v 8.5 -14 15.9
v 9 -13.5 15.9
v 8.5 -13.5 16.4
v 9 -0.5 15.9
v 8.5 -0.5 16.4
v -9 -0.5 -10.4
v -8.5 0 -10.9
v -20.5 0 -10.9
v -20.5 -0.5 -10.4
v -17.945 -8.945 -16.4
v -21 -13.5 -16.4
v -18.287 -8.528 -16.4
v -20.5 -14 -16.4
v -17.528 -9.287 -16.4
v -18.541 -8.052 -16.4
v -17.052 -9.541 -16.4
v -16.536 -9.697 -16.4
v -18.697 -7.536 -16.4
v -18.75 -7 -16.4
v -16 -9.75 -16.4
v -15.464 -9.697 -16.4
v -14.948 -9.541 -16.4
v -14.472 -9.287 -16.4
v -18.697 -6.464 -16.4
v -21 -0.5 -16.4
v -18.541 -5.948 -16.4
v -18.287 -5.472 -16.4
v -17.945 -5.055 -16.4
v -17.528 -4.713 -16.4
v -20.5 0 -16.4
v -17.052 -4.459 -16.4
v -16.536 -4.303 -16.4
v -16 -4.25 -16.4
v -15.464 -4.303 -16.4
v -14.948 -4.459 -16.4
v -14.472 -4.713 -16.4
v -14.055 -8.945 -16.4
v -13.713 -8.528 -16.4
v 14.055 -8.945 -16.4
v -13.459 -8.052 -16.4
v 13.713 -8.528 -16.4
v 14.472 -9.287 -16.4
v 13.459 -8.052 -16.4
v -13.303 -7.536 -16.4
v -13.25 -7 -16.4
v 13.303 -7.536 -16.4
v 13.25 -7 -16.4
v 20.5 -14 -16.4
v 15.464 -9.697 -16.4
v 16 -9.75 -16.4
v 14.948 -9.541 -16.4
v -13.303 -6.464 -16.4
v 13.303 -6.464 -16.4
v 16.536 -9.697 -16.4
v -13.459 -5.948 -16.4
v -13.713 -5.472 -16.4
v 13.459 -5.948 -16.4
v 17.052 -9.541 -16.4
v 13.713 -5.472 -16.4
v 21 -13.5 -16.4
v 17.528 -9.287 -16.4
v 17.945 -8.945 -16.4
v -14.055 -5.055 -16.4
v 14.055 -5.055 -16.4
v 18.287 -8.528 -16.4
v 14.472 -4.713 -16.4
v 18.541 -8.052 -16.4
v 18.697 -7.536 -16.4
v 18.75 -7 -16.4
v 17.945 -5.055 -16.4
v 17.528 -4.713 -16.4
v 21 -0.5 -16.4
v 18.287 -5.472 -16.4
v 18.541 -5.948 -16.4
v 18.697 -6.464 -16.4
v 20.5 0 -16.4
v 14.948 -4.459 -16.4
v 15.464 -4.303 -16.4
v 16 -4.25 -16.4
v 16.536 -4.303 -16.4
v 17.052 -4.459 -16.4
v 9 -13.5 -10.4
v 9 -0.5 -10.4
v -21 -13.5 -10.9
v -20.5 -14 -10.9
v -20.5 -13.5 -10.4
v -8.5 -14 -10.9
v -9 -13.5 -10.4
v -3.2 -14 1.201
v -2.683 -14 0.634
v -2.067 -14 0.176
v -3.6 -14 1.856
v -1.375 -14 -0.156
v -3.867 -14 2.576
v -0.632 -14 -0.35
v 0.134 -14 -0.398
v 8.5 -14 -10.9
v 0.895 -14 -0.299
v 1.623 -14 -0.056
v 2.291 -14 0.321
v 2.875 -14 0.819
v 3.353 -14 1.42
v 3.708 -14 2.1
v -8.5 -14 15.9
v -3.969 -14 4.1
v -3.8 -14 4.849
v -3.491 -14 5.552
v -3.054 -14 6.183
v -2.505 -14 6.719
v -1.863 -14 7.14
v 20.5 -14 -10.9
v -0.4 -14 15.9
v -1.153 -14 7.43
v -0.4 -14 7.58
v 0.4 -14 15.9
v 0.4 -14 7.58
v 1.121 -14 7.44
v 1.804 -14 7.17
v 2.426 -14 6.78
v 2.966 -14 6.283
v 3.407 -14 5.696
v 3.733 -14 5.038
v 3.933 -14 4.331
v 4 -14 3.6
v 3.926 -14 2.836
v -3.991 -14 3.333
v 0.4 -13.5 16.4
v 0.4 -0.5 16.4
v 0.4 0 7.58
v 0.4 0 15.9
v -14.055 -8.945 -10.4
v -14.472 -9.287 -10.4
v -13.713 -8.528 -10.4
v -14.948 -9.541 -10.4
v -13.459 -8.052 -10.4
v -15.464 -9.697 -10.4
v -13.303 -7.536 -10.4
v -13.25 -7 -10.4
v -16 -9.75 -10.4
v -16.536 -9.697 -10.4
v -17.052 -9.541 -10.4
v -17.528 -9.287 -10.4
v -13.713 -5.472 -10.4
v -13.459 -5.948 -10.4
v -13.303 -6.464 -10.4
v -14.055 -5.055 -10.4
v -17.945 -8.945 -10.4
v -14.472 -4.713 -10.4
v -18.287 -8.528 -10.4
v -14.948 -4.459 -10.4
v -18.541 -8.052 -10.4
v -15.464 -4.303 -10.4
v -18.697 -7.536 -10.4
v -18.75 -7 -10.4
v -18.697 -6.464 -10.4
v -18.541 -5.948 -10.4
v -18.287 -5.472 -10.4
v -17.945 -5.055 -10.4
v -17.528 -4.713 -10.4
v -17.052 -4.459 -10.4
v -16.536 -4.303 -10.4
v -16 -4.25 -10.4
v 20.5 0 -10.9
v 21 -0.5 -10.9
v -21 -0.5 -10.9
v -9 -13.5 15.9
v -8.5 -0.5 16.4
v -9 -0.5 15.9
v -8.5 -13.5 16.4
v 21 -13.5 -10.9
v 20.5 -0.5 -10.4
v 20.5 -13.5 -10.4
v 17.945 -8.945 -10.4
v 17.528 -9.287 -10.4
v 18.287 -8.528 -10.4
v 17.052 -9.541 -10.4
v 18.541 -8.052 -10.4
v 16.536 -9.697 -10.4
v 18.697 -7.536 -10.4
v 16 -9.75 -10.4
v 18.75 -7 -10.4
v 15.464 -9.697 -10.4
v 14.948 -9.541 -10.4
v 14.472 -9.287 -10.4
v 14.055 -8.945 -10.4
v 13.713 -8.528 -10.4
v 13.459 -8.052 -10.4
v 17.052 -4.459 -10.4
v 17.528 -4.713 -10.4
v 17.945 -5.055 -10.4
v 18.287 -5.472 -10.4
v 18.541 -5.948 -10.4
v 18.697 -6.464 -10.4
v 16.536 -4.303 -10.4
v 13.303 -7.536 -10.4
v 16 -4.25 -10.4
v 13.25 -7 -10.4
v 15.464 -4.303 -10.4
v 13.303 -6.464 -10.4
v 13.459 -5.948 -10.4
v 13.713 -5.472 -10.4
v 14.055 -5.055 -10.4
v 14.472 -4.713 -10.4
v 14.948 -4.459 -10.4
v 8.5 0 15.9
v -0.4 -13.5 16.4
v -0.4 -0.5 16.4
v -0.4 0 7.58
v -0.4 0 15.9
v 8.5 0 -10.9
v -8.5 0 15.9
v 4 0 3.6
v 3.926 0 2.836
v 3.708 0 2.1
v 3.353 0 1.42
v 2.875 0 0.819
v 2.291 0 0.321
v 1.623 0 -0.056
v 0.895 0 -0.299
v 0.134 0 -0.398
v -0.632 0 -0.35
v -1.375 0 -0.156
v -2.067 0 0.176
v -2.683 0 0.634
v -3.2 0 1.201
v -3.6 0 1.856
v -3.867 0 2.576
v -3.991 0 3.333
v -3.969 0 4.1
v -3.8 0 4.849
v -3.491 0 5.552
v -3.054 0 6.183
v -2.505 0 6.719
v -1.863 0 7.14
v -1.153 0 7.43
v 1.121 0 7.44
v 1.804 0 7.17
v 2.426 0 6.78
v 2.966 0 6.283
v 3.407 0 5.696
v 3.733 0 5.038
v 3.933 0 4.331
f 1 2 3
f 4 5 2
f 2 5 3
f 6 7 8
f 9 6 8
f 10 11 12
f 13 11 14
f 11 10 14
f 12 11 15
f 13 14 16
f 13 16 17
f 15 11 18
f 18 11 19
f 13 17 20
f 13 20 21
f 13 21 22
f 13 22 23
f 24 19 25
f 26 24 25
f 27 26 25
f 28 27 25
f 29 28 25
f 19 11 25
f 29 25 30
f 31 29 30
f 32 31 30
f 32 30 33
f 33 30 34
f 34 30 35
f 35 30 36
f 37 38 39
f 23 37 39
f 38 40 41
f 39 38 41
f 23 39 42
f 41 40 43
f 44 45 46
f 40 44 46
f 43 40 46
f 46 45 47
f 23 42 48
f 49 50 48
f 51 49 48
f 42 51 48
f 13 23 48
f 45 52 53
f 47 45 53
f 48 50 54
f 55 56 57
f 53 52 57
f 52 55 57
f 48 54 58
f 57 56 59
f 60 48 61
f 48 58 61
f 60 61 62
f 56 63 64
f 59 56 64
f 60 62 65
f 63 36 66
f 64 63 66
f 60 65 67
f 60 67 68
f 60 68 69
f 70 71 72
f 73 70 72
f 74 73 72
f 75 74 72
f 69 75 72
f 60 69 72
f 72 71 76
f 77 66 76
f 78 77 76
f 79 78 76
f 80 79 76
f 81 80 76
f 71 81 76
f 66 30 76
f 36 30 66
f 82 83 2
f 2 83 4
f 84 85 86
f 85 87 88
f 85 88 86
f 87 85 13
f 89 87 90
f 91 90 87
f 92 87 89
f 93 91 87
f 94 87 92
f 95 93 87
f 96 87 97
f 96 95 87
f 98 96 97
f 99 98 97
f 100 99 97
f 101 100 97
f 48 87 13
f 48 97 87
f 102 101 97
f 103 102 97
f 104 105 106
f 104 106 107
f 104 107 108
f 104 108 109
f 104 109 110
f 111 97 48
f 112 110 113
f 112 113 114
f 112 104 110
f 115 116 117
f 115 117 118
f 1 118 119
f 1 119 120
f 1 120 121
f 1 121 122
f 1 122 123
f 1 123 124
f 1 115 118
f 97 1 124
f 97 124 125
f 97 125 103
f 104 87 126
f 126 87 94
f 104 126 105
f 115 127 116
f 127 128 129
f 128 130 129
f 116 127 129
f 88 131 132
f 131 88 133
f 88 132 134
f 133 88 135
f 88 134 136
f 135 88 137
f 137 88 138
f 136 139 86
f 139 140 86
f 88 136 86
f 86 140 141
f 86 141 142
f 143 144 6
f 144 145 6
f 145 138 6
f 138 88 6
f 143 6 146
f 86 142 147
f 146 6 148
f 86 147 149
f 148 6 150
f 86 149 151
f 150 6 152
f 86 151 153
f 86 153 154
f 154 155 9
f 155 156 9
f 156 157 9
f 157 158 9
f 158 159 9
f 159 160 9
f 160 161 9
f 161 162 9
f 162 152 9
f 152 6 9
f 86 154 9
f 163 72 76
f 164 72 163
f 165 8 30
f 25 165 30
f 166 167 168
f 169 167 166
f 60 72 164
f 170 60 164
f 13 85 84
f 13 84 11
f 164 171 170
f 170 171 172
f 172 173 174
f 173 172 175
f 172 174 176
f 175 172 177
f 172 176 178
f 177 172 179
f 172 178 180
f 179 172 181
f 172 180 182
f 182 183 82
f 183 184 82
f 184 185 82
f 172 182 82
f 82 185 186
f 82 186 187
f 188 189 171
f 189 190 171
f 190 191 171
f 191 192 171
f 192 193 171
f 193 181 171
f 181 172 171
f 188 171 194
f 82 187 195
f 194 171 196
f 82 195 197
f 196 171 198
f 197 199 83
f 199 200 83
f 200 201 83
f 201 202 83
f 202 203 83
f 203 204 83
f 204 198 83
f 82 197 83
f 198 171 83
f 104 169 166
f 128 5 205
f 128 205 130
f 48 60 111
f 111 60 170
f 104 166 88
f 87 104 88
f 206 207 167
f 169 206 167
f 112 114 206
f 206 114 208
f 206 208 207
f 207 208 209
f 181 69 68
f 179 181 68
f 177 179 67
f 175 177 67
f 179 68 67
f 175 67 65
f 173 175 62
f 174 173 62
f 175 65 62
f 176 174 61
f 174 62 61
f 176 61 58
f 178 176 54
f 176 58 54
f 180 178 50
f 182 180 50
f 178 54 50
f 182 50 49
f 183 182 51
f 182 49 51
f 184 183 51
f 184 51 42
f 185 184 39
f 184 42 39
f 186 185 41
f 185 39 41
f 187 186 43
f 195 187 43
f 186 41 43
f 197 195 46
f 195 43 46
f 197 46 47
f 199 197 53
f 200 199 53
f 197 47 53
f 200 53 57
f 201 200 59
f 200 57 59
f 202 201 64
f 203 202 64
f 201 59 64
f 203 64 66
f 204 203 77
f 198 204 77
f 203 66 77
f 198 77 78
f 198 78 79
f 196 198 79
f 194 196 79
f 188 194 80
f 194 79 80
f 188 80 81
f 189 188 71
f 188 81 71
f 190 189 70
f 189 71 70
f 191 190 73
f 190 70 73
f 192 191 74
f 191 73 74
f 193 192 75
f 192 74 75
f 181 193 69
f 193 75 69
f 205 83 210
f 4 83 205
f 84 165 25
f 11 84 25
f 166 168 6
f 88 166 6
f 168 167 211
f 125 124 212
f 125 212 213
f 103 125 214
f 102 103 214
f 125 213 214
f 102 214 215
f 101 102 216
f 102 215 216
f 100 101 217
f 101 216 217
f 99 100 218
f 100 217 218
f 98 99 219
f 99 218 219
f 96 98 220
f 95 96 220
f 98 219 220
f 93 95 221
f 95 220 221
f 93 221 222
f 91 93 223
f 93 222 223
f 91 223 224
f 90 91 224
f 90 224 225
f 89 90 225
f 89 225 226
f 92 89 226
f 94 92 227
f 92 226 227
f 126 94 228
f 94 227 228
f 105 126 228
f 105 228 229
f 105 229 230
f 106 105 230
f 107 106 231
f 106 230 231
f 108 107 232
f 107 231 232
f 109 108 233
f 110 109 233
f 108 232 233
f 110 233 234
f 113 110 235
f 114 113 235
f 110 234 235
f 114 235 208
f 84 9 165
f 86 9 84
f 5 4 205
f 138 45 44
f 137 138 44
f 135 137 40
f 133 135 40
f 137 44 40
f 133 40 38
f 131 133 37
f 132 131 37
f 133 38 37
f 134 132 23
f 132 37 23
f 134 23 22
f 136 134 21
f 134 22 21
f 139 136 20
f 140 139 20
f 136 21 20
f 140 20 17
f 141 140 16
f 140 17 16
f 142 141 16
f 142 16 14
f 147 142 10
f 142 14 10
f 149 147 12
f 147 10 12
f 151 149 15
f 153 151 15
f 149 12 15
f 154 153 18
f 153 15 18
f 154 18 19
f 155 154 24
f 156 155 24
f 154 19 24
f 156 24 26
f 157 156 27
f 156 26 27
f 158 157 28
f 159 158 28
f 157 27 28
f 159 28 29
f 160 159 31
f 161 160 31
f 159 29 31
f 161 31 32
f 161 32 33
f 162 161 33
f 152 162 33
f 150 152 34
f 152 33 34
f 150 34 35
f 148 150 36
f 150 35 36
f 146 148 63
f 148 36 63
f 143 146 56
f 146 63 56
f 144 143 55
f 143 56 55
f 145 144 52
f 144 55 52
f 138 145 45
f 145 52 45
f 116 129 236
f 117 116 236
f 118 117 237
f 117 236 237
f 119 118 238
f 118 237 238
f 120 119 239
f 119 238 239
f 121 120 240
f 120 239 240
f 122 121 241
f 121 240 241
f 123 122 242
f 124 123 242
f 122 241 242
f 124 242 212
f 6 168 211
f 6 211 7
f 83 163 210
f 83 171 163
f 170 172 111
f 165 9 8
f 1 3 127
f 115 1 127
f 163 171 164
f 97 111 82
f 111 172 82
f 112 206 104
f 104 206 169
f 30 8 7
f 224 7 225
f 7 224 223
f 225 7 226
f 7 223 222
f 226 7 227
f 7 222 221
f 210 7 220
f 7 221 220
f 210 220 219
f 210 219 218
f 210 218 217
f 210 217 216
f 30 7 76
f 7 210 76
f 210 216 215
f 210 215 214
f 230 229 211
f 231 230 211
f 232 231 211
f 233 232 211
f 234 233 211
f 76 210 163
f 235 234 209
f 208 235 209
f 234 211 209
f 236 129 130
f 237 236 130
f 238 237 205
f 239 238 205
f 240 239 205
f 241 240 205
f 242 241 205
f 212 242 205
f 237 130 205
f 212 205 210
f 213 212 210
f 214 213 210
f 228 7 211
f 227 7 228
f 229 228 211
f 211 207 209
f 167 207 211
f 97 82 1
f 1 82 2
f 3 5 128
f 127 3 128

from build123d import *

# Parameters (mm, degrees)
F1_DEPTH = 14
F2_R     = 2.75
F3_DEPTH = 6
F4_SIZE  = 0.5


with BuildPart() as f1:
    # F0 (on Front) → F1 (new body)
    with BuildSketch(Plane.XZ):
        with BuildLine():
            Line((-21, -10.4), (-21, -16.4))
            Line((-21, -16.4), (21, -16.4))
            Line((21, -16.4), (21, -10.4))
            Line((21, -10.4), (9, -10.4))
            Line((9, -10.4), (9, 16.4))
            Line((9, 16.4), (0.4, 16.4))
            Line((0.4, 16.4), (0.4, 7.5799497484))
            ThreePointArc((0.4, 7.5799497484), (2.9664793948, 6.283281573), (4, 3.6))
            ThreePointArc((4, 3.6), (-2.683281573, 0.6335206052), (-0.4, 7.5799497484))
            Line((-0.4, 7.5799497484), (-0.4, 16.4))
            Line((-0.4, 16.4), (-9, 16.4))
            Line((-9, 16.4), (-9, -10.4))
            Line((-9, -10.4), (-21, -10.4))
        make_face()
    extrude(amount=F1_DEPTH)

    # F2 (on face) → F3 (cut)
    with BuildSketch(Plane(origin=(0, 0, -16.4), x_dir=(1, 0, 0), z_dir=(0, 0, -1))):
        with Locations((-16, 7)):
            Circle(F2_R)
        with Locations((16, 7)):
            Circle(F2_R)
    extrude(amount=-F3_DEPTH, mode=Mode.SUBTRACT)

    # F4
    f4_edges = [f1.edges().sort_by_distance(p)[0] for p in [
        (9, -7, 16.4),
        (-4.7, -14, 16.4),
        (-4.7, 0, 16.4),
        (-9, -7, 16.4),
        (9, -14, 3),
        (9, 0, 3),
        (15, 0, -10.4),
        (15, -14, -10.4),
        (21, -7, -10.4),
        (21, -14, -13.4),
        (21, 0, -13.4),
        (-9, -14, 3),
        (-15, -14, -10.4),
        (-21, -14, -13.4),
        (-21, -7, -10.4),
        (-9, 0, 3),
        (-15, 0, -10.4),
        (-21, 0, -13.4),
        (4.7, 0, 16.4),
        (4.7, -14, 16.4),
    ]]
    chamfer(f4_edges, length=F4_SIZE)


solid = f1.part
